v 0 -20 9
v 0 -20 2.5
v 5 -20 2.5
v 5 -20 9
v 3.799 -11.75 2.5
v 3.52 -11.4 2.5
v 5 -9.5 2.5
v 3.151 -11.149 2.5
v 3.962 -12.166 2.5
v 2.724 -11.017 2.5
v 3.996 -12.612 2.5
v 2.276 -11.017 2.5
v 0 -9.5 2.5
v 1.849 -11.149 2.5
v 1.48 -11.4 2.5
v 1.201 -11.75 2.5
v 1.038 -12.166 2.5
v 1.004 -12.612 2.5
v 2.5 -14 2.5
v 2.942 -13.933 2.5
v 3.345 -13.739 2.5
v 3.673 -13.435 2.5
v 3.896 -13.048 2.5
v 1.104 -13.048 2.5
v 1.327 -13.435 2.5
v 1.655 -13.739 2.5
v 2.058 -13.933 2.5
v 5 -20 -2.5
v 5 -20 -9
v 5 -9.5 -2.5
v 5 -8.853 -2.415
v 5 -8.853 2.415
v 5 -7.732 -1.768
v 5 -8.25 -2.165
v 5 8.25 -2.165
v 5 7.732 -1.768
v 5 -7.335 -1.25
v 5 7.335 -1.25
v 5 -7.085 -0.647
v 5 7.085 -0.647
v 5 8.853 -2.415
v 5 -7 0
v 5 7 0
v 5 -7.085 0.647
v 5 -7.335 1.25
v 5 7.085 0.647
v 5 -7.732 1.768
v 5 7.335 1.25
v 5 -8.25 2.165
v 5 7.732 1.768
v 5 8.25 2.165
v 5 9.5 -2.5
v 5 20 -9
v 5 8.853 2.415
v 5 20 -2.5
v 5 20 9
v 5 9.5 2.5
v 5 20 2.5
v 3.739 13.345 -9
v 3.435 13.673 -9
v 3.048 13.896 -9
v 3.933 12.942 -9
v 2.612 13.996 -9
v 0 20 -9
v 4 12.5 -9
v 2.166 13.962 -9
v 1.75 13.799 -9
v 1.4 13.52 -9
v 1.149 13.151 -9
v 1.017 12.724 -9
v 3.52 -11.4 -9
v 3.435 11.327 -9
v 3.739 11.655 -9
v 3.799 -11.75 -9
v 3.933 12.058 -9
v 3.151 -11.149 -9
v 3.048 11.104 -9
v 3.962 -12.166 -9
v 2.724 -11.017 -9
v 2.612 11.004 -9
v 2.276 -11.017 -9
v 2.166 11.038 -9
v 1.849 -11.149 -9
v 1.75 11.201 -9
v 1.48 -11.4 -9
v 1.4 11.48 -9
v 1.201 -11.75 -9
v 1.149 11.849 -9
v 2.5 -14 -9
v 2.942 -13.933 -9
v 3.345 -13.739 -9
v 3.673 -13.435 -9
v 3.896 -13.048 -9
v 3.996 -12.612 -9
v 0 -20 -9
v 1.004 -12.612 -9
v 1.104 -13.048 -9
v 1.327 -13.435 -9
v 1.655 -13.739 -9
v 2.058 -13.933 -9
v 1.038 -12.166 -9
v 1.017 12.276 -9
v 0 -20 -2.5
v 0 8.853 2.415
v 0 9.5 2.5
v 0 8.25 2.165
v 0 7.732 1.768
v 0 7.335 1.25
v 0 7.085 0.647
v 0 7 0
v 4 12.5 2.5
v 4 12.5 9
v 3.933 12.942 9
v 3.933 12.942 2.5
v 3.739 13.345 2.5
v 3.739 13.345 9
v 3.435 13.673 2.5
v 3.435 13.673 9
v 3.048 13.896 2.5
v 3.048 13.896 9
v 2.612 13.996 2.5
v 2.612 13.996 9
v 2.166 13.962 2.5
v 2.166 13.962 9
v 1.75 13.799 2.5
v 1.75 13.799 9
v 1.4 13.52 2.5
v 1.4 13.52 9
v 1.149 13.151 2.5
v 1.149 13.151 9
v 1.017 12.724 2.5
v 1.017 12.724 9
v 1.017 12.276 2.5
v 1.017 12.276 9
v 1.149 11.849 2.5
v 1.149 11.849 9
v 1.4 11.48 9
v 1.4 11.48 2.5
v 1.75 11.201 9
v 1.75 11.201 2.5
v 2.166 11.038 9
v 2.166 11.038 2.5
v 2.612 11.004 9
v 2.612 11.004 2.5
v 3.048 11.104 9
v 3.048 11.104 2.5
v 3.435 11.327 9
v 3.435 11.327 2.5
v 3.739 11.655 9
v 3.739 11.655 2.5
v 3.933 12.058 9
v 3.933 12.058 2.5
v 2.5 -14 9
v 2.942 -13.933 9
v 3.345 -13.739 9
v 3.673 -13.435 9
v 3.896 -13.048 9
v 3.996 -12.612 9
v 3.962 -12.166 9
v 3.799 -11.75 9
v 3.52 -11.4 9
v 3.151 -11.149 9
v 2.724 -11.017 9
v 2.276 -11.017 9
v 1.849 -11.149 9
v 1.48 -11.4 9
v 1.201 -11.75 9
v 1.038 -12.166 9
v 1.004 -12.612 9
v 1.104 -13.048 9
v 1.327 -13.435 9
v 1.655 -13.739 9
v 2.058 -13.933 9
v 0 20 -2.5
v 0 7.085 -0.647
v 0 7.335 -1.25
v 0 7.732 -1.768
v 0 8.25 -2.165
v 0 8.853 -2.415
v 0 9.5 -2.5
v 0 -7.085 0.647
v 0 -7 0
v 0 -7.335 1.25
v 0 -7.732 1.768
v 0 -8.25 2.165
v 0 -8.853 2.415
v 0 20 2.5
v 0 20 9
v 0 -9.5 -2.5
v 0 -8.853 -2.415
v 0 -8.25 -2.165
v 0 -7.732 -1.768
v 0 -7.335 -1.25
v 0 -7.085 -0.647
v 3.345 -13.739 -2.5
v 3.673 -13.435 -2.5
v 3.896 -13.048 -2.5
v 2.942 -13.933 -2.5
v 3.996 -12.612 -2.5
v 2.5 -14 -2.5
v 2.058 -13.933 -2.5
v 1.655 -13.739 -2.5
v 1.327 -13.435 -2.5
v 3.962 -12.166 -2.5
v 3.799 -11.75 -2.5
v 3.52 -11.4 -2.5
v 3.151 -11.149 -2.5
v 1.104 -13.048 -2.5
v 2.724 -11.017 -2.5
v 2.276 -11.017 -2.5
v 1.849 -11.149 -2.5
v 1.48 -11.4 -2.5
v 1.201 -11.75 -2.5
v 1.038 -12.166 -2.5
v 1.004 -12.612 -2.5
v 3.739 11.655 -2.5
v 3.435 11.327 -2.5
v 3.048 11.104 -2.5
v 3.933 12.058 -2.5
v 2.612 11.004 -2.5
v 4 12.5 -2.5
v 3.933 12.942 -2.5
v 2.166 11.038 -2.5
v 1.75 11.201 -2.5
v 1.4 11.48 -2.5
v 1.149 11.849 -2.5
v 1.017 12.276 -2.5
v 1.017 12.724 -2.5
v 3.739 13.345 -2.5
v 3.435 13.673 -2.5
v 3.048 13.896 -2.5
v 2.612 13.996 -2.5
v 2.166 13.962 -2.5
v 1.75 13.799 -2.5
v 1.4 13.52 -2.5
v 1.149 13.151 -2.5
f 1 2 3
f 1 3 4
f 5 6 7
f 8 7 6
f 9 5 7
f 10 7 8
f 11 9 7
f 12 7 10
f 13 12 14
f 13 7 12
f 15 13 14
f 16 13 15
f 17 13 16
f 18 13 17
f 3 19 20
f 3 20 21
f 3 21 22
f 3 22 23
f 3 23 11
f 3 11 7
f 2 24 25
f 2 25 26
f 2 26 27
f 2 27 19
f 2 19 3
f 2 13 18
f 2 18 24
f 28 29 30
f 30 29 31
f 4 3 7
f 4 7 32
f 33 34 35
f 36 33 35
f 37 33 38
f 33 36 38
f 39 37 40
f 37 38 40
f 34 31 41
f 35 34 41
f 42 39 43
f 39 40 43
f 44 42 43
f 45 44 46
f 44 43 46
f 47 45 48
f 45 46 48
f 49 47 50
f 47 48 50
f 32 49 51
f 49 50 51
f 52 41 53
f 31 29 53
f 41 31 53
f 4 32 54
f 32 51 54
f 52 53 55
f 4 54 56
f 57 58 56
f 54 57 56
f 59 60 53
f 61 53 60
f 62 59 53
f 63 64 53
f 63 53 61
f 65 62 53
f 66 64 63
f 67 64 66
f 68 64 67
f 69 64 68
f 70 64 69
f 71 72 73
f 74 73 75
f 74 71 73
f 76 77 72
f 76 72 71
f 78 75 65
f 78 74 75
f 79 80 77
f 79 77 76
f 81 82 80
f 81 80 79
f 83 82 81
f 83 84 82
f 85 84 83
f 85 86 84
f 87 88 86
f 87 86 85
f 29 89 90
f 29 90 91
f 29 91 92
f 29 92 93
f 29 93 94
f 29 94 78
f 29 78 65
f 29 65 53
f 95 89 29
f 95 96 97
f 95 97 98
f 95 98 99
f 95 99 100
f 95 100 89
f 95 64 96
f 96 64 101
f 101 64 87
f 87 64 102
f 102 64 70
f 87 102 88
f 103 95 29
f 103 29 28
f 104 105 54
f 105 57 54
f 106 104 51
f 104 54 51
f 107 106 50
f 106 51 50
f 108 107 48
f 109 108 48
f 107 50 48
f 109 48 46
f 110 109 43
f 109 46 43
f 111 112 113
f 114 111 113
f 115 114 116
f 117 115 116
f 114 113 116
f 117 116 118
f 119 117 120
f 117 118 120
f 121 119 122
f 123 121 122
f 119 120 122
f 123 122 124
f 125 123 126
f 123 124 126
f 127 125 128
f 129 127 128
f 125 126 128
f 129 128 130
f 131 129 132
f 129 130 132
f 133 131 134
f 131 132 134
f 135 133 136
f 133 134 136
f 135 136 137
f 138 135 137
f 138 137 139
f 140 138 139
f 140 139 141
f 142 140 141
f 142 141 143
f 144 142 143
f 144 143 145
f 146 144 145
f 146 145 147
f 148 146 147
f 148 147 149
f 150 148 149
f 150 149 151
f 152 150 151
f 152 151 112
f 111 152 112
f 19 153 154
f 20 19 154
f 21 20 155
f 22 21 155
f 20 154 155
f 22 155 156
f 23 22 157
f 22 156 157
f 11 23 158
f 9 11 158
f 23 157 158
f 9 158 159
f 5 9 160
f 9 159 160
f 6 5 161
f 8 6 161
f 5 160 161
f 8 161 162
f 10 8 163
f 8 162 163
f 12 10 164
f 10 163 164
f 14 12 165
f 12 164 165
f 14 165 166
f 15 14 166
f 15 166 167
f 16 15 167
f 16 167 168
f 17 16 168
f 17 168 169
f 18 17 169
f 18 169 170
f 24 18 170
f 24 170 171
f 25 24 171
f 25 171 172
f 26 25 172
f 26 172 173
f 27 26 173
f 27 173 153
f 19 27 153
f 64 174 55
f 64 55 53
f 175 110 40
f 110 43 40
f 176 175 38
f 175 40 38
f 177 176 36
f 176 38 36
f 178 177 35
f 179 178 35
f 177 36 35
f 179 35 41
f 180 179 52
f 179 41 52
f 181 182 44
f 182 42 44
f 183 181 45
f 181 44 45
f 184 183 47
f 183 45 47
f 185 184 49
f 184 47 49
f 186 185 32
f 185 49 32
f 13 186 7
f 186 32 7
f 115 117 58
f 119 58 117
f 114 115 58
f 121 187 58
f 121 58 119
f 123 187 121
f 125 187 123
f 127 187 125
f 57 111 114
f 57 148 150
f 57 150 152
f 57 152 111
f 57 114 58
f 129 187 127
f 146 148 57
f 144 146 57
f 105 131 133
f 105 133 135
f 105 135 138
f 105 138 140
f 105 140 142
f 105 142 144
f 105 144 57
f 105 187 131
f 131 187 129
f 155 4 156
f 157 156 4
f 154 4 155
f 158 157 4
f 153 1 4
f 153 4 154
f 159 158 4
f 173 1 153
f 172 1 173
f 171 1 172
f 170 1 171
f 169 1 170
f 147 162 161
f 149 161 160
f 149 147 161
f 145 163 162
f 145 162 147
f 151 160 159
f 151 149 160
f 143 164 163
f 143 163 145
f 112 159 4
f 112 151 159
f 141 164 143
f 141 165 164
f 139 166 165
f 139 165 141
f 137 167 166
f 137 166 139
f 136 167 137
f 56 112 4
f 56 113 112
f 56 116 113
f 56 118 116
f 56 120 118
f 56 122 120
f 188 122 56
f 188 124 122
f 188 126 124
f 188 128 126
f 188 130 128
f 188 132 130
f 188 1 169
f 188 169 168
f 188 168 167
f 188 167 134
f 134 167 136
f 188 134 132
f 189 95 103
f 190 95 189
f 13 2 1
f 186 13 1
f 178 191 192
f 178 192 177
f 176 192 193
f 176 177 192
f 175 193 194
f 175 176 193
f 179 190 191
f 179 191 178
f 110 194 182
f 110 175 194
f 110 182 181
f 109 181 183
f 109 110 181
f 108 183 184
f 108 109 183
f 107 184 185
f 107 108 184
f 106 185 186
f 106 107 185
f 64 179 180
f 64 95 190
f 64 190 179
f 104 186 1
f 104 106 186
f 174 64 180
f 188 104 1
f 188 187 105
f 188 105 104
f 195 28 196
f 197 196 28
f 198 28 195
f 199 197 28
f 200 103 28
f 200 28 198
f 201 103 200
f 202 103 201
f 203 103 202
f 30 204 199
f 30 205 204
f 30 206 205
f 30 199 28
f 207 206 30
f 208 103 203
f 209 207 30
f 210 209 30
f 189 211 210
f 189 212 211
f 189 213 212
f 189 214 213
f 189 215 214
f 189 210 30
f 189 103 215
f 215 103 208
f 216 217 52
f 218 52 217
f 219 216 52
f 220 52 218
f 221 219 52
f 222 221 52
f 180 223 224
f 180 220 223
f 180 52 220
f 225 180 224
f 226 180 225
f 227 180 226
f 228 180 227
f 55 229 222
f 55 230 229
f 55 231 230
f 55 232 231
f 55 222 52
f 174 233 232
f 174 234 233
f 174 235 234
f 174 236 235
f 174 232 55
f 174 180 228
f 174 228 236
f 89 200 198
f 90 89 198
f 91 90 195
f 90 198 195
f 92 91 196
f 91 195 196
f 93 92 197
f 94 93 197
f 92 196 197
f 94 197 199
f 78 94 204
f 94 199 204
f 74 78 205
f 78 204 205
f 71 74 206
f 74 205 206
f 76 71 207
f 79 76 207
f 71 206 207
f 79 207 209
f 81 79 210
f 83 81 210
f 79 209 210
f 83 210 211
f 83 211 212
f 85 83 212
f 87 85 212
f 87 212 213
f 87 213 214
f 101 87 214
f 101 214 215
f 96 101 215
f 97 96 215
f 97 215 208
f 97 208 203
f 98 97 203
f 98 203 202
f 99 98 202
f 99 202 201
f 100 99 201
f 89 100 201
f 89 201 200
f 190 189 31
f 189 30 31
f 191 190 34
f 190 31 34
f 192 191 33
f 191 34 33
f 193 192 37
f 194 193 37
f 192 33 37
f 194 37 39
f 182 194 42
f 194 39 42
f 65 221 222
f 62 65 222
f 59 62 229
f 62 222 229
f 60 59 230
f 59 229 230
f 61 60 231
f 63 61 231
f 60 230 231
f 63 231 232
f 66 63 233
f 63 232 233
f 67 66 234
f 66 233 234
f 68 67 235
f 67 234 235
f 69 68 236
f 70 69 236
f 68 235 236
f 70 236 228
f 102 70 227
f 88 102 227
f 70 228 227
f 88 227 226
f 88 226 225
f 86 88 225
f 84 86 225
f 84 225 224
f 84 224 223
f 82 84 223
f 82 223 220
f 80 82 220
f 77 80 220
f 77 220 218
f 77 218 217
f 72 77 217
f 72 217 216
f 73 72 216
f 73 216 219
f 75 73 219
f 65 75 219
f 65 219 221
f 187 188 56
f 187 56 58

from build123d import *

# Parameters (mm, degrees)
EXTRUDE_1_DEPTH     = 5
SKETCH_2_R          = 1.5
CUT_EXTRUDE_1_DEPTH = 21
FILLET_1_R          = 2.5


with BuildPart() as part:
    # 草图1 → 凸台-拉伸1 (new body)
    with BuildSketch(Plane(origin=(0, 0, 0), x_dir=(0, 0, -1), z_dir=(1, 0, 0))):
        Polygon((-2.5, 20), (-2.5, 7), (2.5, 7), (2.5, 20), (9, 20), (9, -20), (2.5, -20), (2.5, -7), (-2.5, -7), (-2.5, -20), (-9, -20), (-9, 20), align=None)
    extrude(amount=EXTRUDE_1_DEPTH)

    # 草图2 → 切除-拉伸1 (cut)
    with BuildSketch(Plane.XY.offset(9)):
        with Locations((2.5, 12.5)):
            Circle(SKETCH_2_R)
        with Locations(Location((2.5, -12.5, 0), (0, 0, 270))):
            Circle(SKETCH_2_R)
    extrude(amount=-CUT_EXTRUDE_1_DEPTH, mode=Mode.SUBTRACT)

    # 圆角1
    fillet_1_edges = [part.edges().sort_by_distance(p)[0] for p in [
        (2.5, 7, -2.5),
        (2.5, 7, 2.5),
        (2.5, -7, -2.5),
        (2.5, -7, 2.5),
    ]]
    fillet(fillet_1_edges, radius=FILLET_1_R - 0.0001)  # a hair under: the kernel refuses the full size


solid = part.part
